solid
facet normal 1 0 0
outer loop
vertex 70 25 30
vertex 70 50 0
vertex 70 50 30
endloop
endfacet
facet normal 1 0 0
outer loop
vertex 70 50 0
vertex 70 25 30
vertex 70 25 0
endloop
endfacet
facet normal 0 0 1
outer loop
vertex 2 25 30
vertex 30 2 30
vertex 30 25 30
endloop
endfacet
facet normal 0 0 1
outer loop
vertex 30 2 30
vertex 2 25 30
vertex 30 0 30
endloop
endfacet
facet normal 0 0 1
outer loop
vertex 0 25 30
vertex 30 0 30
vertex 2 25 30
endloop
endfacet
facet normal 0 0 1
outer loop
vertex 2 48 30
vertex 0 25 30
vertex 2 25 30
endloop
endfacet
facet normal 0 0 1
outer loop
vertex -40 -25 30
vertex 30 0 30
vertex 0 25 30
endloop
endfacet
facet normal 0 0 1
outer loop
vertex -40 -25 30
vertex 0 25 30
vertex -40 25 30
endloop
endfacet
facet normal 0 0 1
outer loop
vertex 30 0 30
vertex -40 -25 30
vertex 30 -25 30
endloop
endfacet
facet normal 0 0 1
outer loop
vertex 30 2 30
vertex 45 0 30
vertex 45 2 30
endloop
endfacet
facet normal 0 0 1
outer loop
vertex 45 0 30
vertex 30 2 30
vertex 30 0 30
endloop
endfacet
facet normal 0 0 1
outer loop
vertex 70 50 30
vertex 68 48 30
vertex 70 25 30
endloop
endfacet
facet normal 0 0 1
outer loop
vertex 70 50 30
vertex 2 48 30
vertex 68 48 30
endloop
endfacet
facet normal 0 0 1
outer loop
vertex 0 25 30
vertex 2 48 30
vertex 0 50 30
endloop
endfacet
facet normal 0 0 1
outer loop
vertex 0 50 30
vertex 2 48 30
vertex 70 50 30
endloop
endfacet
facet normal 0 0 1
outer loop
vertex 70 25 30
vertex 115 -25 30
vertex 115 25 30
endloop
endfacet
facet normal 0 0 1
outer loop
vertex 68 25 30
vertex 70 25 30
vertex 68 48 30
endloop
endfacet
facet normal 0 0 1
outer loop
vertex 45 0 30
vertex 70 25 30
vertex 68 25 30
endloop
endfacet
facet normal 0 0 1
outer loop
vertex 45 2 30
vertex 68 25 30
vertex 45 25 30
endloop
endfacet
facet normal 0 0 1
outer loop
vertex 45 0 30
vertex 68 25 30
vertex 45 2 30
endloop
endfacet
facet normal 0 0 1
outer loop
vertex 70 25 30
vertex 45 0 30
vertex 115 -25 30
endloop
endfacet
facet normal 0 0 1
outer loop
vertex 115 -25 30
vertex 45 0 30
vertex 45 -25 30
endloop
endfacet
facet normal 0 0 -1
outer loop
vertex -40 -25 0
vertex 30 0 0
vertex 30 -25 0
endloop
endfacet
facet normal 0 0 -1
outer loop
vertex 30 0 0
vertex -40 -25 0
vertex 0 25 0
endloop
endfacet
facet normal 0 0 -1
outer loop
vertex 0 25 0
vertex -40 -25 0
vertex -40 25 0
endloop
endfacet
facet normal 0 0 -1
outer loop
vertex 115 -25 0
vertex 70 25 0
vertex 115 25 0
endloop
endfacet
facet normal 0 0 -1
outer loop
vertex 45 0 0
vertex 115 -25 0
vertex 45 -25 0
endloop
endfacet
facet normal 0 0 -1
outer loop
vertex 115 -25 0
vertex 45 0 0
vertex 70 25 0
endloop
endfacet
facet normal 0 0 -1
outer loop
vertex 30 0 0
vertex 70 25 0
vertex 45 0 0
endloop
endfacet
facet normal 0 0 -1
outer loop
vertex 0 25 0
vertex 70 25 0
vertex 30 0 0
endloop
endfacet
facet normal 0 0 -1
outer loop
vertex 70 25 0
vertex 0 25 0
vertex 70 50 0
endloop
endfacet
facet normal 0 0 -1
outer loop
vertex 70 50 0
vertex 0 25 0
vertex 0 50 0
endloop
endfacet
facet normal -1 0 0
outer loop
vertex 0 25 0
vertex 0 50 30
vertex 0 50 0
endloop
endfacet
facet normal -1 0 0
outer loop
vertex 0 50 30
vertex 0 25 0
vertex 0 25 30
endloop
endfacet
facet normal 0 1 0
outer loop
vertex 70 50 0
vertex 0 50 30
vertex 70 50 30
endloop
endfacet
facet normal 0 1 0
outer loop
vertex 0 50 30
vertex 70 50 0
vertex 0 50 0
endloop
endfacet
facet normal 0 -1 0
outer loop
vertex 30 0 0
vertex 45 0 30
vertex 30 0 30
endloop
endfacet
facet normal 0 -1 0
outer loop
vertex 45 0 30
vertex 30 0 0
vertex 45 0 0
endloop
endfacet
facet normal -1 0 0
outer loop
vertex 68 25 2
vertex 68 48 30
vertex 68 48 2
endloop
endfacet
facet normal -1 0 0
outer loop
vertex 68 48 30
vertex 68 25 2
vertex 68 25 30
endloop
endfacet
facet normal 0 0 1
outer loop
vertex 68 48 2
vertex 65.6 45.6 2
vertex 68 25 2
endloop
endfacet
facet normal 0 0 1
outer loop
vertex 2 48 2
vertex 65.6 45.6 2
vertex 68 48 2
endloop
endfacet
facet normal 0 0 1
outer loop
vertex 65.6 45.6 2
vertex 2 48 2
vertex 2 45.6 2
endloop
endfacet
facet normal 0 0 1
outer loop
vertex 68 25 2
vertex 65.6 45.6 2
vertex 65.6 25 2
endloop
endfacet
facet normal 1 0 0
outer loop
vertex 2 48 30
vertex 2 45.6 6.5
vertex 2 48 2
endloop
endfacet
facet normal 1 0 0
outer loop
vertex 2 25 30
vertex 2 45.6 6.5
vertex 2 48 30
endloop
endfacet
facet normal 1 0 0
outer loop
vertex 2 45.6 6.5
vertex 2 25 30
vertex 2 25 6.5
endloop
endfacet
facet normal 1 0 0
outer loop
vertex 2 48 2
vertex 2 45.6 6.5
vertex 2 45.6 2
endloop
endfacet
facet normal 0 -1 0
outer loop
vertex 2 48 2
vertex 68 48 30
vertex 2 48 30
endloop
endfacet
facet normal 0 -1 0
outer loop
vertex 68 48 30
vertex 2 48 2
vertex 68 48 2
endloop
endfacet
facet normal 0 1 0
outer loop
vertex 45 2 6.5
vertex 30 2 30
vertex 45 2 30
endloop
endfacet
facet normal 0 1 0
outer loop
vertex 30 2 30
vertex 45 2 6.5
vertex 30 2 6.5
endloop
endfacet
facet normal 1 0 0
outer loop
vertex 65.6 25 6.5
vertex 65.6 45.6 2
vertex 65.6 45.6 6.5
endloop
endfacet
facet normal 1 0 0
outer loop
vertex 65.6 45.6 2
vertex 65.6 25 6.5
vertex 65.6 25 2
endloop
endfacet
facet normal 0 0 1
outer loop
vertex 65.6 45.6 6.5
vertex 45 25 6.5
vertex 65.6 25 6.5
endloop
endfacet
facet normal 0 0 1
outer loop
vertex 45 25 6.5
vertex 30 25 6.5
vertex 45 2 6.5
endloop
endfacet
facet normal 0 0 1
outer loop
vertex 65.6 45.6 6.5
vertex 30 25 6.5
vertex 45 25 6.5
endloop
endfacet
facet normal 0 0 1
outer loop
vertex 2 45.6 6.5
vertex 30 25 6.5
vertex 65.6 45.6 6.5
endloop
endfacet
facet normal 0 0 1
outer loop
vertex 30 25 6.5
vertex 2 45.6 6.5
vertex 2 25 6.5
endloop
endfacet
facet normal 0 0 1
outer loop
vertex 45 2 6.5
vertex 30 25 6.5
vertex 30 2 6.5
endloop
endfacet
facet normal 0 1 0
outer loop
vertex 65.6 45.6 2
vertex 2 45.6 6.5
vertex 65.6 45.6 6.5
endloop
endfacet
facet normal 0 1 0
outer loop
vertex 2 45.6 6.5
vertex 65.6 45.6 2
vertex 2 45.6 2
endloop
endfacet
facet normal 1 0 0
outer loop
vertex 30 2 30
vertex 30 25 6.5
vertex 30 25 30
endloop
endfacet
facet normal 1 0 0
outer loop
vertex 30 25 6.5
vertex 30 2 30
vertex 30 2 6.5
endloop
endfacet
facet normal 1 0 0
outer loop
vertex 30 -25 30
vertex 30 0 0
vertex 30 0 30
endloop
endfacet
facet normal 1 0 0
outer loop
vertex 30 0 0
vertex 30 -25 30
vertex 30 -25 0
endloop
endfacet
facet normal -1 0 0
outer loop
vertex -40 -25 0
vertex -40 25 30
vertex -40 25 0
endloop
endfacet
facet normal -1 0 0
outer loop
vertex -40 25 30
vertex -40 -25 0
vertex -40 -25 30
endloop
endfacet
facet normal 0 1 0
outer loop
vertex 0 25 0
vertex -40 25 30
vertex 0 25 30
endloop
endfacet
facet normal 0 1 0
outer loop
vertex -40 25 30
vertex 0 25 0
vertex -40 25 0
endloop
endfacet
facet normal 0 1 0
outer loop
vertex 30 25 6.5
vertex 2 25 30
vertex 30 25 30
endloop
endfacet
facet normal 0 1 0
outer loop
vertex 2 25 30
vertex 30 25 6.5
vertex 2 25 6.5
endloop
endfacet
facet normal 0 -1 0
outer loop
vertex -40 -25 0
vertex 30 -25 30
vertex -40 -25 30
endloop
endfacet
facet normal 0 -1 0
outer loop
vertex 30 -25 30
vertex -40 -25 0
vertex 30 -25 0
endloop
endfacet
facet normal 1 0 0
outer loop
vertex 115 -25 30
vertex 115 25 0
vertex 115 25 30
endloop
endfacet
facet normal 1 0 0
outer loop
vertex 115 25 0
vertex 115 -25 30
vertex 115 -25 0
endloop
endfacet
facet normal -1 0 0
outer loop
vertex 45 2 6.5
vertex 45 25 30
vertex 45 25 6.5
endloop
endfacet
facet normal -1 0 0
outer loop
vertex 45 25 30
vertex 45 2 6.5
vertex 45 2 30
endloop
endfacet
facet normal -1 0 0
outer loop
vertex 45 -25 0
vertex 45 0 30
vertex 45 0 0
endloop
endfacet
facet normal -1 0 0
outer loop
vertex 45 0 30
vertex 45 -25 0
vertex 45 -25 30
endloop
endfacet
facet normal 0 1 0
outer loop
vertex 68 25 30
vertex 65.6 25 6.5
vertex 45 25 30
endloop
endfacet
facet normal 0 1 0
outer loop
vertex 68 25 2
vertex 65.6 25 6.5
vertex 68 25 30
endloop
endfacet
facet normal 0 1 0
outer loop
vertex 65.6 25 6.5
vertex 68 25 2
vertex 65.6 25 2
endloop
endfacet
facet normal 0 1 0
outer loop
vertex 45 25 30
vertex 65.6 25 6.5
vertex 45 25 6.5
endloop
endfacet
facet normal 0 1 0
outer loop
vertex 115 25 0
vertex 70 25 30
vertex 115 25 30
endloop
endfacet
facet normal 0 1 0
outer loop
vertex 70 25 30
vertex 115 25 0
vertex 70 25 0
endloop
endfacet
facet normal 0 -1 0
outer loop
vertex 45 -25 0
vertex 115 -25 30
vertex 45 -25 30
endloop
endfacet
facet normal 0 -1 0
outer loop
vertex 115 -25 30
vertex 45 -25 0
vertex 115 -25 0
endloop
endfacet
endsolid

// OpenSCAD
// Two-part enclosure for a small electronics board (e.g. Arduino-based temperature logger)
// Print orientation: box upright, lid upside down. They print together with a 10 mm gap.
// Units: mm

// ---------------- Parameters ----------------
box_x      = 70;    // box outer length (X)
box_y      = 50;    // box outer width (Y)
box_h      = 30;    // box outer height (Z)
wall       = 2;     // box wall thickness
floor      = 2;     // box floor thickness

lip_t      = 1.5;   // lip wall thickness
lip_h      = 4;     // lip height above plate
lip_x      = 65.6;  // lip outer length (X)
lip_y      = 45.6;  // lip outer width (Y)
clearance  = 0.2;   // side clearance between lip and box opening

eps        = 0.5;   // cutter overshoot past faces
$fn        = 64;

// ---------------- Derived ----------------
box_i_x = box_x - 2 * wall;   // inner length
box_i_y = box_y - 2 * wall;   // inner width
box_i_h = box_h - floor;      // inner height (open top)

// ---------------- Model ----------------
union() {
    // Part 1: Box
    difference() {
        cube([box_x, box_y, box_h]);
        translate([wall, wall, floor])
            cube([box_i_x, box_i_y, box_i_h + eps]);   // open-top cavity
    }

    // Part 2: Lid (printed upside down)
    union() {
        // Base plate
        translate([0, 0, 0])
            cube([box_x, box_y, 2]);

        // Rectangular lip, centred on plate, extends past the box opening
        translate([0, 0, 2])
            cube([lip_x, lip_y, lip_h + eps]);
    }
}

// ---------------- Positioning ----------------
translate([-box_x / 2 - 5, -box_y / 2, 0])   // box, centred in XY
cube([box_x, box_y, box_h]);

translate([box_x / 2 + 10, -box_y / 2, 0])   // lid, centred in XY, on +X side
cube([box_x, box_y, box_h]);
